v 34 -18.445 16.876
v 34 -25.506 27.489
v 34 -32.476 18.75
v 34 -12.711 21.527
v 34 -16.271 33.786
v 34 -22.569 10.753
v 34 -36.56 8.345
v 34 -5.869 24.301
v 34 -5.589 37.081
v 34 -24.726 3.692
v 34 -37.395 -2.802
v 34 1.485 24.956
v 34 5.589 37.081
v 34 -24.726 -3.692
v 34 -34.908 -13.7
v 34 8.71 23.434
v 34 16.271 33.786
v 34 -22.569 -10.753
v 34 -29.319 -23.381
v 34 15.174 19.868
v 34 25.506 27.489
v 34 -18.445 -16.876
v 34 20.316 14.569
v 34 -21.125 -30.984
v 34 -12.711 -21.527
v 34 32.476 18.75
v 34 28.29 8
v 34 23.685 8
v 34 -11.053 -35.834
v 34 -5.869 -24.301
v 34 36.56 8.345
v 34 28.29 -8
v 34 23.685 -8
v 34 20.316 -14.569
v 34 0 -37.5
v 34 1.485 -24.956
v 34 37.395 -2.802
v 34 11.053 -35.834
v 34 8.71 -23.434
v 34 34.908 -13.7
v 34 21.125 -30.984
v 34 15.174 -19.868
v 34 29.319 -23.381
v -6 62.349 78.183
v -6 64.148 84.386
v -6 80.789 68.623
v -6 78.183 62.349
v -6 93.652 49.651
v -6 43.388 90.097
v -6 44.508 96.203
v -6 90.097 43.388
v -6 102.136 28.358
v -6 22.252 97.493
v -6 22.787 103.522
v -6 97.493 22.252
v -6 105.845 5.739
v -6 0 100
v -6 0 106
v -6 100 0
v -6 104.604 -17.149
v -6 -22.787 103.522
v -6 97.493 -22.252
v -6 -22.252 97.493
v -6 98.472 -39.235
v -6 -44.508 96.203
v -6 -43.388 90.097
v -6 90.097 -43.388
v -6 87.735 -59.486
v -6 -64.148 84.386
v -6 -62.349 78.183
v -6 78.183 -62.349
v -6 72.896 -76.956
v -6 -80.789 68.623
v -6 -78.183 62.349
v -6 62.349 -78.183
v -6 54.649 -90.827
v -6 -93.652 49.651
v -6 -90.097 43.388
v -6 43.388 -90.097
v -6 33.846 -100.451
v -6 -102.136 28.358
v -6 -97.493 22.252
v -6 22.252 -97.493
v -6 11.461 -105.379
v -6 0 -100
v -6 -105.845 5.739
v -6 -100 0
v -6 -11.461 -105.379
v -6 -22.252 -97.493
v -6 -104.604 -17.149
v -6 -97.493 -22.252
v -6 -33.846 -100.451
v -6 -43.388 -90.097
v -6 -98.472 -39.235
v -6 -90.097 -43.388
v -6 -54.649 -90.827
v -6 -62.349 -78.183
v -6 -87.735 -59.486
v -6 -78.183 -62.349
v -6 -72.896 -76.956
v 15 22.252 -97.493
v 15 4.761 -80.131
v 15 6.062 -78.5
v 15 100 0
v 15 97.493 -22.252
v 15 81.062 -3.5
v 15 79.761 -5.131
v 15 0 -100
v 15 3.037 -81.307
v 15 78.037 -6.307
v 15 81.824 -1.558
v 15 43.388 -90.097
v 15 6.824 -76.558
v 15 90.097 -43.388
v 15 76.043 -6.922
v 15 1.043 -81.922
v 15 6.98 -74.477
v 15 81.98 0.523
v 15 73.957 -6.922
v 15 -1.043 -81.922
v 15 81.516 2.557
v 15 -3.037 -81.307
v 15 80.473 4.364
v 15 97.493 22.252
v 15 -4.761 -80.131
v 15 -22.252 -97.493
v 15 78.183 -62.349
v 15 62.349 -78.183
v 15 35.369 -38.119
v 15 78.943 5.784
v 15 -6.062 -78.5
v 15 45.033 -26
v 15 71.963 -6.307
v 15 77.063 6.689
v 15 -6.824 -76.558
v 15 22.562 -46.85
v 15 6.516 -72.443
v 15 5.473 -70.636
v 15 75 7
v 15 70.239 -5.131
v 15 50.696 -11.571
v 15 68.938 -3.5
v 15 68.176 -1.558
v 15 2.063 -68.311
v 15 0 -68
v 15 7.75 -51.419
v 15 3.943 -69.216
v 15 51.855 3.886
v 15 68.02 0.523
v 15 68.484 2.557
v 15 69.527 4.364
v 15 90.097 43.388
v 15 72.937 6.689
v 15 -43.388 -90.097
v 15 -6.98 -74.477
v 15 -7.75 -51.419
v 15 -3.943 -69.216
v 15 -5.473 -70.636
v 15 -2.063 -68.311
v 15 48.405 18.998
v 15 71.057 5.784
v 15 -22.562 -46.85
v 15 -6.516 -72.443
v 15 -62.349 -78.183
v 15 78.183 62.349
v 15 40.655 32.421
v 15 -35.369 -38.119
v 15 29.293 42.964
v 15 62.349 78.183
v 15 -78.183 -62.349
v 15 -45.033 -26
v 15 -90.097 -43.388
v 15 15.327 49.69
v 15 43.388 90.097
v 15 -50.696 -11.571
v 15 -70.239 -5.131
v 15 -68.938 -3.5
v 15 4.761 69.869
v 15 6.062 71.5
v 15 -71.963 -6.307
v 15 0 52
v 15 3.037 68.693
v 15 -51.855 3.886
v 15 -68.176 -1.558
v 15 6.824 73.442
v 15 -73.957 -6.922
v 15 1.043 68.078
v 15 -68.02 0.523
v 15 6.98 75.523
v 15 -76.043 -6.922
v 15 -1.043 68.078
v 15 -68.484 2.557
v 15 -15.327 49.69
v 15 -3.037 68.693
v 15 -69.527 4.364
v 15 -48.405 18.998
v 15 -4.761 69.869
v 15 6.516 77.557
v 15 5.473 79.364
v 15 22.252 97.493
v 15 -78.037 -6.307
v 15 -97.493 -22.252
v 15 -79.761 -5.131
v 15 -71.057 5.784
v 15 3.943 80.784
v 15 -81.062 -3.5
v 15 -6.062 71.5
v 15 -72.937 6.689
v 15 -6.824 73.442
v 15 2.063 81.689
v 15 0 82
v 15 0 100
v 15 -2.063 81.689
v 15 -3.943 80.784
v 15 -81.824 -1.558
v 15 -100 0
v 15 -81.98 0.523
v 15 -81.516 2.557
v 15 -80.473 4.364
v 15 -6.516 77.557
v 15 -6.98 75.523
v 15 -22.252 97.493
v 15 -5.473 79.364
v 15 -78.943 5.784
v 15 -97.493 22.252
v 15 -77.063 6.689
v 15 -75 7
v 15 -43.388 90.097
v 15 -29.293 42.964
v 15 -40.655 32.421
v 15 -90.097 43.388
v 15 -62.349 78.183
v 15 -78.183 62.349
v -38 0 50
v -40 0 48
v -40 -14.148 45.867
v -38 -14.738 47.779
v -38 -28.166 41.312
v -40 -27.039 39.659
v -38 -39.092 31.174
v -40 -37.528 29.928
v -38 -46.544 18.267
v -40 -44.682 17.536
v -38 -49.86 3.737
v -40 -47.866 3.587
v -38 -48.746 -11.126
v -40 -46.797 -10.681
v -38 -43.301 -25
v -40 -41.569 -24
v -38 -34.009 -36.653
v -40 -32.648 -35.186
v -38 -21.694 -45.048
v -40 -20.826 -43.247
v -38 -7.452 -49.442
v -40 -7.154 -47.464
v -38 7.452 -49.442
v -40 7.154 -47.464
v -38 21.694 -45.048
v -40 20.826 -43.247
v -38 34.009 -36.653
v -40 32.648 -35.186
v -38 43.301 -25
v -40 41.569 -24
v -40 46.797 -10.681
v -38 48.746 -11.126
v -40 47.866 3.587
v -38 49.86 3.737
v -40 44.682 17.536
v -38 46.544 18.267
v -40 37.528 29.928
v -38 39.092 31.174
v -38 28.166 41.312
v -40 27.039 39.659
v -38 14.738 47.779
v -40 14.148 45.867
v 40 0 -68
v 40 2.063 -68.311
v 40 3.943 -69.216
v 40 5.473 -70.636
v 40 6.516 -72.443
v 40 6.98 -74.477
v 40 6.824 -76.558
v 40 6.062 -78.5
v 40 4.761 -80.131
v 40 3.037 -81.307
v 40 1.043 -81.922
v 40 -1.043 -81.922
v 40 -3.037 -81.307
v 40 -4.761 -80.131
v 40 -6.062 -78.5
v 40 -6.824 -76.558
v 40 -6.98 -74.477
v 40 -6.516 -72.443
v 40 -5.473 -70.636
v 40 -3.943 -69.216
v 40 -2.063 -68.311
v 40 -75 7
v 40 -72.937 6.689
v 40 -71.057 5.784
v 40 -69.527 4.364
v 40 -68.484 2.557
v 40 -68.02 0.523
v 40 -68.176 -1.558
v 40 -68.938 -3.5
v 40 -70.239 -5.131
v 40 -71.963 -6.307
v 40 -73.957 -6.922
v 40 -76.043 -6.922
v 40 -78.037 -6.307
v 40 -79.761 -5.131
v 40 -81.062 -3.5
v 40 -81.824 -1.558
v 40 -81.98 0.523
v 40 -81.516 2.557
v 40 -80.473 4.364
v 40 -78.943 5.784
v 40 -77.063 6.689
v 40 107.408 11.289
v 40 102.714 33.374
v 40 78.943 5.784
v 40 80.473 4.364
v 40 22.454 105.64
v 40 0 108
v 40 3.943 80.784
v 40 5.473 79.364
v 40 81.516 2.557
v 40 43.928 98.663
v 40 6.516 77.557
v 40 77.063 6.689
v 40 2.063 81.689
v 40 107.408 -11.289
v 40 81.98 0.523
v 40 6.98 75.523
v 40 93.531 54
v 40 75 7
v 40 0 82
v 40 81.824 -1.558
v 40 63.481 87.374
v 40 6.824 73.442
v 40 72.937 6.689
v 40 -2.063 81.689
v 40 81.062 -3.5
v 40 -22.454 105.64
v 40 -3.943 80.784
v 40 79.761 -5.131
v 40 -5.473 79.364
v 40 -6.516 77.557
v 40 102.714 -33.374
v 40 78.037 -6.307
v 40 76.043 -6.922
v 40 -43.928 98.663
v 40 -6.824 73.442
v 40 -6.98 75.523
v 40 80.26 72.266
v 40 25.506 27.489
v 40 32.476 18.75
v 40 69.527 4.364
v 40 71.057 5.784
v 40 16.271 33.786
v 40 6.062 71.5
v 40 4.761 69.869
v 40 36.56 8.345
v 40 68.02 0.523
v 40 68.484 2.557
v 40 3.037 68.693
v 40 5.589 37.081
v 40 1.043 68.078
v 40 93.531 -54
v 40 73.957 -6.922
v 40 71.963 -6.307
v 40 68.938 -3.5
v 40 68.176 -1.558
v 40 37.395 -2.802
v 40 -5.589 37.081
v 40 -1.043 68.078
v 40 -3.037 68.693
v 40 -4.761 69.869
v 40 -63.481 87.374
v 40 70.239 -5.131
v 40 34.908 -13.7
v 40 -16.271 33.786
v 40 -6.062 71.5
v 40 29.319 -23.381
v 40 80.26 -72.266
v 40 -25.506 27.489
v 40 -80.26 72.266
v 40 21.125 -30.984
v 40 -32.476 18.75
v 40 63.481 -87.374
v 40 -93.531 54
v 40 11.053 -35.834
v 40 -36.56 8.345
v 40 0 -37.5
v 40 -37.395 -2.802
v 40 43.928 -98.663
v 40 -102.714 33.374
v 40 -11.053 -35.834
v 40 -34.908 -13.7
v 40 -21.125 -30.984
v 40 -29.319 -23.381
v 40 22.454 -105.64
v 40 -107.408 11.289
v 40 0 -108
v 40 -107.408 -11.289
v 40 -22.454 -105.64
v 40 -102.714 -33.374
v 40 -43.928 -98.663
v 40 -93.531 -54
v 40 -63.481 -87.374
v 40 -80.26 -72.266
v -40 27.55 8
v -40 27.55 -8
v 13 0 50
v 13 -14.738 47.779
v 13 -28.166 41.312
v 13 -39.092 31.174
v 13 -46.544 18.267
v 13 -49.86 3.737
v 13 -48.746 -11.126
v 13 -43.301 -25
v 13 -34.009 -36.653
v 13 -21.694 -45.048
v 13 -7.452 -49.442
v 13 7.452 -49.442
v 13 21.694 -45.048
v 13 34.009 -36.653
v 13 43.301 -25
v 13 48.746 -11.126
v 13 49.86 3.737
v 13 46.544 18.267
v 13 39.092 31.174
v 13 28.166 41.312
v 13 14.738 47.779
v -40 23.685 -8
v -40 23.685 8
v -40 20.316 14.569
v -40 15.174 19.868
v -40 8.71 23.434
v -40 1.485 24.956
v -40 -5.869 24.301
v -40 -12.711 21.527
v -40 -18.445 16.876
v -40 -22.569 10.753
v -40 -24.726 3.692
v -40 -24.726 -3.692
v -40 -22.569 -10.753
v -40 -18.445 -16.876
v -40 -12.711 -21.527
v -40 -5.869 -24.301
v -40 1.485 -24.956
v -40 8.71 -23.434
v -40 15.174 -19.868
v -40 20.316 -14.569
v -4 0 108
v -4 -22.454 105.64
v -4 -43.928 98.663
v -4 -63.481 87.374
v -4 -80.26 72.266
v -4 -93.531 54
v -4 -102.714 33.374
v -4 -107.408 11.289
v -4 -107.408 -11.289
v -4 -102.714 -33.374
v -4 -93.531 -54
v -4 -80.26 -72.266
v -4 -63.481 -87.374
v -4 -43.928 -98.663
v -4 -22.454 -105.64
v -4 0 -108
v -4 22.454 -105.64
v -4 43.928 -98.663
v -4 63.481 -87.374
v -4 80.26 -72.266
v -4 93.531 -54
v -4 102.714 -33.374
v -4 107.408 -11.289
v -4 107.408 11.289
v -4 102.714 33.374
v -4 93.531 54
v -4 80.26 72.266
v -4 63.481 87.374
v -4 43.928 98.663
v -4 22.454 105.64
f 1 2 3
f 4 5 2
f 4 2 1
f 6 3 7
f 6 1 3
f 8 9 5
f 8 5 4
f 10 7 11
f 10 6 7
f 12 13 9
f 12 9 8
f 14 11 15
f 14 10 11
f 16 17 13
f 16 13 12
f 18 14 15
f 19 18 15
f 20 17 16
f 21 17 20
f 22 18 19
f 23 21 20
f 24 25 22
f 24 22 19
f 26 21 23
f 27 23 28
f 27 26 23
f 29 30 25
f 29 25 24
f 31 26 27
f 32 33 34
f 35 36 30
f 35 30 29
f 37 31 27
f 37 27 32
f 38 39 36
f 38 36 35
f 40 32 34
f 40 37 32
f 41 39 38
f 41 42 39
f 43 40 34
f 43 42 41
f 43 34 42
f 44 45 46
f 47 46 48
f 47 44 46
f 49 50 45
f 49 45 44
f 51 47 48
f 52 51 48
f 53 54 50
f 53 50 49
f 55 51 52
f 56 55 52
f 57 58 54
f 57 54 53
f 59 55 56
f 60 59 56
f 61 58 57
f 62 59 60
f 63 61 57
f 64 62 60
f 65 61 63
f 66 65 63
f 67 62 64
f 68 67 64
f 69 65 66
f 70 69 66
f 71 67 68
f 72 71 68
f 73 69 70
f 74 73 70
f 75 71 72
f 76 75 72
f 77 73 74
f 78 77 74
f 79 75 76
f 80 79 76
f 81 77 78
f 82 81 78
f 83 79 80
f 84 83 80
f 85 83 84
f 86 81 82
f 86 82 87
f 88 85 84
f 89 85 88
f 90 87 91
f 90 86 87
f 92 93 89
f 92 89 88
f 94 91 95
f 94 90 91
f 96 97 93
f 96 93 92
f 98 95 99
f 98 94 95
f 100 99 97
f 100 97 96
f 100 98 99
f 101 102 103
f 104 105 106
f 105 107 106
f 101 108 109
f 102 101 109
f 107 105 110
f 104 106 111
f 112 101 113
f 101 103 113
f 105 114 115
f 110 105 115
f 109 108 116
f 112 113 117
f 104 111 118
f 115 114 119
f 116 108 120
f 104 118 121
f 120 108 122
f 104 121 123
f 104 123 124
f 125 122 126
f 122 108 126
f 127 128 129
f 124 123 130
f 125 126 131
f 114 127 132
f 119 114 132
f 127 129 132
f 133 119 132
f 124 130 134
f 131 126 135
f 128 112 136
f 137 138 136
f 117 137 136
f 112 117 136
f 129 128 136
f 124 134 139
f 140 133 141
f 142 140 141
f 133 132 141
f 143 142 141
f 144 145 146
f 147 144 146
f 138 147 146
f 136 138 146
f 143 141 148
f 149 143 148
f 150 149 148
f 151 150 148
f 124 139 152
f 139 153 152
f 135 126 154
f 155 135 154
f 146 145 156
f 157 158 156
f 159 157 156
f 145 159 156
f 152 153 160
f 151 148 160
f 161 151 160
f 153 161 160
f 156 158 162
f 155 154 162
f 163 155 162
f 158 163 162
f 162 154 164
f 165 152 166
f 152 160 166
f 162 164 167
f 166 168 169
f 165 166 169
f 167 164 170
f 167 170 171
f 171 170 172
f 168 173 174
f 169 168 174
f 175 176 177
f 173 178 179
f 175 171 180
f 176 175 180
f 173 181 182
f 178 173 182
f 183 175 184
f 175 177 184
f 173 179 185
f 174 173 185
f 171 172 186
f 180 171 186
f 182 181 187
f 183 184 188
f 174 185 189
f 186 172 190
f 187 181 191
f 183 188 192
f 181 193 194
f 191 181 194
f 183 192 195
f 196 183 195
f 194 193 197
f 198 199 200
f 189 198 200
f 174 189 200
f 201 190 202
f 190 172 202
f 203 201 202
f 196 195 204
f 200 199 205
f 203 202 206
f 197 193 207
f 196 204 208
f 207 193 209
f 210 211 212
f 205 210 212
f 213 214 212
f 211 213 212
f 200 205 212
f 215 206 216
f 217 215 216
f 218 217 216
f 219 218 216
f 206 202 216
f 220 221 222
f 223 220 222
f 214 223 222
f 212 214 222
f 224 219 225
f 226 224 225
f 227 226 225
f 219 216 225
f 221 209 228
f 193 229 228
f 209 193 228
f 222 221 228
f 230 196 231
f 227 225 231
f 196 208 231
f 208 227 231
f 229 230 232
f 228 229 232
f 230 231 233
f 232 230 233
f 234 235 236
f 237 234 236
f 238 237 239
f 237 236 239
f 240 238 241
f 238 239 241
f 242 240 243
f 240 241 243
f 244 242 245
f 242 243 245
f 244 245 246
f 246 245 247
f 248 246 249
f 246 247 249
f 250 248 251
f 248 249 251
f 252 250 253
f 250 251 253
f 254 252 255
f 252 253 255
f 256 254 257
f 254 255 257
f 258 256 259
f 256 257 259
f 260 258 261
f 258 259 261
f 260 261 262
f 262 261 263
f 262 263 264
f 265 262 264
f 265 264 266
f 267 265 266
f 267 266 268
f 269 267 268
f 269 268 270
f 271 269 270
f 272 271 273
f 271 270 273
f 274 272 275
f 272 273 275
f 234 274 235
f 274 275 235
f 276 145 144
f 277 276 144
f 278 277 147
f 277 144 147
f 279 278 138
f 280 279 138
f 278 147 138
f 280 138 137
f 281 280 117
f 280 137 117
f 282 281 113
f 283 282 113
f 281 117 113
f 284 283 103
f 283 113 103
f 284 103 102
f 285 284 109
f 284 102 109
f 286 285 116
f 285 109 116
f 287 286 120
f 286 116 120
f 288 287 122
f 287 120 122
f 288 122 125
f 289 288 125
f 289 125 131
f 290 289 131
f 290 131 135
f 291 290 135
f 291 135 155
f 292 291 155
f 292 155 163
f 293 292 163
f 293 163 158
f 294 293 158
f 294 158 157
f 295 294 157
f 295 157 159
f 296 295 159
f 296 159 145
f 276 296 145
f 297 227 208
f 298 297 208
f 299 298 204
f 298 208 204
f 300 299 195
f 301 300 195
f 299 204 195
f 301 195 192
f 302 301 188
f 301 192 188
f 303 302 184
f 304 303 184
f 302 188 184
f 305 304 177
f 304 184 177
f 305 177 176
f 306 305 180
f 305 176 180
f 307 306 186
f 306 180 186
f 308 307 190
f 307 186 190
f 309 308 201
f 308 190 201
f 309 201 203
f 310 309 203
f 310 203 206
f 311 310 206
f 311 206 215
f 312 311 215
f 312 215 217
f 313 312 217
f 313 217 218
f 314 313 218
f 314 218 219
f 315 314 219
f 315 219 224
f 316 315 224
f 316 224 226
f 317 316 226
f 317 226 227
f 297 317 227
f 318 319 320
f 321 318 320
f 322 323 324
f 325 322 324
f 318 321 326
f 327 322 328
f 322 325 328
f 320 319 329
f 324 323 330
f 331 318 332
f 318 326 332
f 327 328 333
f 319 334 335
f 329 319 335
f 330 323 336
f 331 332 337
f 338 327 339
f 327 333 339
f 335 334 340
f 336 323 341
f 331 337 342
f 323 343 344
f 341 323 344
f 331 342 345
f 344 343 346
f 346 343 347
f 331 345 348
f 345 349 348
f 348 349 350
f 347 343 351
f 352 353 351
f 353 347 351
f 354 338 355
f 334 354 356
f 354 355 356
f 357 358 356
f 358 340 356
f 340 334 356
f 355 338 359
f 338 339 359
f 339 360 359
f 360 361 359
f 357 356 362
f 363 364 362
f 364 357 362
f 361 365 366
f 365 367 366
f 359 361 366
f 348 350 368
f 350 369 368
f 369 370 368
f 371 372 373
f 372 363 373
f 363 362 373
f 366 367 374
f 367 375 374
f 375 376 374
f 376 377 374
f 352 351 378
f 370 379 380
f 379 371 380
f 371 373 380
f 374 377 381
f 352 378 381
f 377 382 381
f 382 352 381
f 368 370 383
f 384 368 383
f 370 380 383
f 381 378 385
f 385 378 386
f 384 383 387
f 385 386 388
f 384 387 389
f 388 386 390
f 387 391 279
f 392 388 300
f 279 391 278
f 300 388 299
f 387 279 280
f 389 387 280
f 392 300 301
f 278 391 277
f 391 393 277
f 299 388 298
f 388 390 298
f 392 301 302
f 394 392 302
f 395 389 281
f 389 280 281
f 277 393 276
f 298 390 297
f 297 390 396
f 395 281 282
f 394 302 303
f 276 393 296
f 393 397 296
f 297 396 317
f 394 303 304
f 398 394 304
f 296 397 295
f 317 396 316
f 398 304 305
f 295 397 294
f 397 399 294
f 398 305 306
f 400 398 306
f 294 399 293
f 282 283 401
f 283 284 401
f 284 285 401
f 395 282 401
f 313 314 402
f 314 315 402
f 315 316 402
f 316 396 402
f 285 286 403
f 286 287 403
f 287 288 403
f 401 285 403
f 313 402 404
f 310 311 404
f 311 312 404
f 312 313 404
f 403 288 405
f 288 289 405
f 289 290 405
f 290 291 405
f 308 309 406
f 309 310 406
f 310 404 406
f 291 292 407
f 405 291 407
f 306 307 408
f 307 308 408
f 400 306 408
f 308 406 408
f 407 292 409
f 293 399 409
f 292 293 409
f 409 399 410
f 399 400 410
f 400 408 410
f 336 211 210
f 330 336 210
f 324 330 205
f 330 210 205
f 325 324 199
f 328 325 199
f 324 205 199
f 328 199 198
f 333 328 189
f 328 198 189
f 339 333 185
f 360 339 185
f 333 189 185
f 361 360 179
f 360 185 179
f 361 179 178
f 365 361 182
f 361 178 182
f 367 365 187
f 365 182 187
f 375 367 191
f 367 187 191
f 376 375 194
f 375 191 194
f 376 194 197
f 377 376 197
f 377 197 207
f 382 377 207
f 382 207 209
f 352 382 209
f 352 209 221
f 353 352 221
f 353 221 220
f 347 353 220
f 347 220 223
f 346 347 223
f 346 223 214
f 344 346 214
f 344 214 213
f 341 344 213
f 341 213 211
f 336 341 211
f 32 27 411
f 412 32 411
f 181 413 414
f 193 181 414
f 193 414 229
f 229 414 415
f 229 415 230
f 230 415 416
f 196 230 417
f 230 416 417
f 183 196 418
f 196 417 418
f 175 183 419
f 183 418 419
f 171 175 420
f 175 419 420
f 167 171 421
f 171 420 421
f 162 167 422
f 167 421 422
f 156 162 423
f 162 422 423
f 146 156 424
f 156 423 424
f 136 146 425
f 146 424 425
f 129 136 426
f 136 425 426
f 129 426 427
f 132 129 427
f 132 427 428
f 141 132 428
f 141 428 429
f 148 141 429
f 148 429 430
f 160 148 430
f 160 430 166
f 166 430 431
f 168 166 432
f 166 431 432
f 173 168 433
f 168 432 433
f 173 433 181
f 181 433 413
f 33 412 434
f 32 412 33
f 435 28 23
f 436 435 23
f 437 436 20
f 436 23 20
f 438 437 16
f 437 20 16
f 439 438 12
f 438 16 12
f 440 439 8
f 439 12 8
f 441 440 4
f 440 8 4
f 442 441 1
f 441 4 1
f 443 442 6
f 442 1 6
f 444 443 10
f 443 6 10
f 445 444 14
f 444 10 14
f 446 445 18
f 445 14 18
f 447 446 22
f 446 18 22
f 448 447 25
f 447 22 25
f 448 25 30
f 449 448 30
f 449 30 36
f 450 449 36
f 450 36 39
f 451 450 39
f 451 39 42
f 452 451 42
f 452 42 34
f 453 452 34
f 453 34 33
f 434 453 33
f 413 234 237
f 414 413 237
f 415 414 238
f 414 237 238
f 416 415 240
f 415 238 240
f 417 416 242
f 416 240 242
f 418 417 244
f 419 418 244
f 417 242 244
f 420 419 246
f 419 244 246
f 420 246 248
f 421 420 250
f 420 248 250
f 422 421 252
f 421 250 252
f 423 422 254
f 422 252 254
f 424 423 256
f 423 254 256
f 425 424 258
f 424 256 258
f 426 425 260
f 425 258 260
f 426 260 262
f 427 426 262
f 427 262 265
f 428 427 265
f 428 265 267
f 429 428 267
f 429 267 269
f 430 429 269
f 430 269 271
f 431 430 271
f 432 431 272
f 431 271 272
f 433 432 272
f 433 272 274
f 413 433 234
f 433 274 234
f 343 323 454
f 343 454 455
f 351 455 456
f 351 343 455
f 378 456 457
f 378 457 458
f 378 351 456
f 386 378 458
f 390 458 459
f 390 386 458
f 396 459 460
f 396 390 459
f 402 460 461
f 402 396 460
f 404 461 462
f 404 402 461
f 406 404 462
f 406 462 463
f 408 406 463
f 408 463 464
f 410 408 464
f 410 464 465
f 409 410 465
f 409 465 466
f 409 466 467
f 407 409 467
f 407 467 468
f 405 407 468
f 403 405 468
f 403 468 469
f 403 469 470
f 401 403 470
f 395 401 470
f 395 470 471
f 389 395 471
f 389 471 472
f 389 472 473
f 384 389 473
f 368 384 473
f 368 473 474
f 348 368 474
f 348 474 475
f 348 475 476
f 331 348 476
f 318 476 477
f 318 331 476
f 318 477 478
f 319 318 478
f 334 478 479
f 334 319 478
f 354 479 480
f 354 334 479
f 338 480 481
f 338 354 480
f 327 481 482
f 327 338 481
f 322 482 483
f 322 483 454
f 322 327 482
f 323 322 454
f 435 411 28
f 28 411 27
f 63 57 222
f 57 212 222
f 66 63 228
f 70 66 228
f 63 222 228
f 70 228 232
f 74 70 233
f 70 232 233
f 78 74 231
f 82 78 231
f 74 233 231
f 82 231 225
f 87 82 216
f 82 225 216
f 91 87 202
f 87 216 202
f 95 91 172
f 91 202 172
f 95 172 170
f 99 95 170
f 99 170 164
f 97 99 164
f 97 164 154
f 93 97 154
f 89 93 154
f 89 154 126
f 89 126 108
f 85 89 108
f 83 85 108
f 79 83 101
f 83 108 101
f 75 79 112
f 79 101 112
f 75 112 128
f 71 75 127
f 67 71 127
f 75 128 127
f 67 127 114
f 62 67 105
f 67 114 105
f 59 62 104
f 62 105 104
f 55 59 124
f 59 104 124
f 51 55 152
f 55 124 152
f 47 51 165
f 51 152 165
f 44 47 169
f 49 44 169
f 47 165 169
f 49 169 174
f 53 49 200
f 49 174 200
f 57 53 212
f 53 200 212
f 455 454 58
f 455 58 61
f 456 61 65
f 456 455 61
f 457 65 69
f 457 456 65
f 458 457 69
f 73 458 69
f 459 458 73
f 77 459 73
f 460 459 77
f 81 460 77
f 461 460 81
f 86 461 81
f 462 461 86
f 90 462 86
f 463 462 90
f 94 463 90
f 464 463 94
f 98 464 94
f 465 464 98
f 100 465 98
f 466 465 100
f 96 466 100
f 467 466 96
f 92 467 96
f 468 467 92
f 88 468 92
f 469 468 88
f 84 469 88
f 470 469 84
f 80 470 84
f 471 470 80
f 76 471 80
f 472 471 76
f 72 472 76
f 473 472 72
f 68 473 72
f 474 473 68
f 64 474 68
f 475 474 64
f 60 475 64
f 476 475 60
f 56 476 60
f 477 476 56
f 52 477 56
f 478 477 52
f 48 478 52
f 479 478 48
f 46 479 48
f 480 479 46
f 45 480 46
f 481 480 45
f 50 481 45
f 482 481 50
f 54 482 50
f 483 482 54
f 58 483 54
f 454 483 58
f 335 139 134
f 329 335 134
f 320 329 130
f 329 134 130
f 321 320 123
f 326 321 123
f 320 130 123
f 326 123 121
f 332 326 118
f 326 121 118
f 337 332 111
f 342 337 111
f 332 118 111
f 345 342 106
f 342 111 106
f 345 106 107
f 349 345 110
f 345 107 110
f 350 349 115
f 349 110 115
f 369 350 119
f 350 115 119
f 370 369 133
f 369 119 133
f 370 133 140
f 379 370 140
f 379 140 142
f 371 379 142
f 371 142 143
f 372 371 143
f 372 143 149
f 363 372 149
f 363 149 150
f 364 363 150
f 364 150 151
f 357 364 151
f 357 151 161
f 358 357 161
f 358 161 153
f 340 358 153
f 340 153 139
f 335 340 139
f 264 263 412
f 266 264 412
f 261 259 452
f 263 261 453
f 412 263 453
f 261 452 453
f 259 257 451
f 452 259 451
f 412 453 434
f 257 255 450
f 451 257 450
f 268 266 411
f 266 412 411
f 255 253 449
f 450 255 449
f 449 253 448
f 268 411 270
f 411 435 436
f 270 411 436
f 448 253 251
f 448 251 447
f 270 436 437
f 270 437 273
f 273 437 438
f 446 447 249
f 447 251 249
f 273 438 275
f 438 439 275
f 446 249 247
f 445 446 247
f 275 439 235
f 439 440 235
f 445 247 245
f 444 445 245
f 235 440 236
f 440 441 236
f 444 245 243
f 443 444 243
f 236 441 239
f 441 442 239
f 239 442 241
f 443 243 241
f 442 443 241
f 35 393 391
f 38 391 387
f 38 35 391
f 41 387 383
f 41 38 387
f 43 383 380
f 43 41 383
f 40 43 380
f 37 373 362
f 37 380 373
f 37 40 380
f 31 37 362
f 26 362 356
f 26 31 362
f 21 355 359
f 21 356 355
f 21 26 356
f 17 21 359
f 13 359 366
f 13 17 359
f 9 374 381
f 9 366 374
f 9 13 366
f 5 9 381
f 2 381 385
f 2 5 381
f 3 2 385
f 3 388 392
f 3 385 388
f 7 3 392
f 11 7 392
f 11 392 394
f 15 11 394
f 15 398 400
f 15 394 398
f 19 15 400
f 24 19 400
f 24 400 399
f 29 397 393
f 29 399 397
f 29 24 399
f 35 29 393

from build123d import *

# Parameters (mm, degrees)
M16X2_0_TAPPED_HOLE1_D = 14
SKETCH4_W              = 21
SKETCH4_H              = 8
CUT_EXTRUDE1_DEPTH     = 8
CHAMFER2_SIZE          = 2
CUT_EXTRUDE2_START     = -11
SKETCH6_R              = 37.5
CUT_EXTRUDE2_DEPTH     = 11


with BuildPart() as part:
    # Sketch1 → Revolve1 (revolve)
    with BuildSketch(Plane.XY, mode=Mode.PRIVATE) as revolve1_sk:
        Polygon((-40, 25), (40, 25), (45, 25), (45, 37.5), (40, 37.5), (40, 108), (15, 108), (15, 50), (-40, 50), align=None)
    revolve(revolve1_sk.sketch.rotate(Axis((-40, 0, 0), (1, 0, 0)), 90), axis=Axis((-40, 0, 0), (1, 0, 0)))

    # M16x2.0 Tapped Hole1 (through all)
    with Locations(Plane(origin=(40, 0, 0), x_dir=(0, 0, -1), z_dir=(1, 0, 0))):
        with Locations((-75, 0), (0, 75), (75, 0), (0, -75)):
            Hole(M16X2_0_TAPPED_HOLE1_D / 2)

    # Sketch4 → Revolve2 (revolve)
    with BuildSketch(Plane.XY, mode=Mode.PRIVATE) as revolve2_sk:
        with Locations((4.5, 104)):
            Rectangle(SKETCH4_W, SKETCH4_H)
    revolve(revolve2_sk.sketch.rotate(Axis((0, 0, 0), (1, 0, 0)), 90), axis=Axis((0, 0, 0), (1, 0, 0)))

    # Sketch5 → Cut-Extrude1 (cut, symmetric)
    with BuildSketch(Plane.XY):
        Polygon((-40, 0), (45, 0), (45, 28.4), (-40, 27.55), align=None)
    extrude(amount=CUT_EXTRUDE1_DEPTH, both=True, mode=Mode.SUBTRACT)

    # Chamfer2
    chamfer2_edges = [part.edges().sort_by_distance(p)[0] for p in [
        (45, 0, -37.5),
        (-6, 0, -108),
        (-40, 0, -50),
        (15, 0, -50),
    ]]
    chamfer(chamfer2_edges, length=CHAMFER2_SIZE)

    # Sketch6 → Cut-Extrude2 (cut)
    with BuildSketch(Plane(origin=(45, 0, 0), x_dir=(0, 0, -1), z_dir=(1, 0, 0)).offset(CUT_EXTRUDE2_START)):
        Circle(SKETCH6_R)
    extrude(amount=CUT_EXTRUDE2_DEPTH, mode=Mode.SUBTRACT)


solid = part.part
